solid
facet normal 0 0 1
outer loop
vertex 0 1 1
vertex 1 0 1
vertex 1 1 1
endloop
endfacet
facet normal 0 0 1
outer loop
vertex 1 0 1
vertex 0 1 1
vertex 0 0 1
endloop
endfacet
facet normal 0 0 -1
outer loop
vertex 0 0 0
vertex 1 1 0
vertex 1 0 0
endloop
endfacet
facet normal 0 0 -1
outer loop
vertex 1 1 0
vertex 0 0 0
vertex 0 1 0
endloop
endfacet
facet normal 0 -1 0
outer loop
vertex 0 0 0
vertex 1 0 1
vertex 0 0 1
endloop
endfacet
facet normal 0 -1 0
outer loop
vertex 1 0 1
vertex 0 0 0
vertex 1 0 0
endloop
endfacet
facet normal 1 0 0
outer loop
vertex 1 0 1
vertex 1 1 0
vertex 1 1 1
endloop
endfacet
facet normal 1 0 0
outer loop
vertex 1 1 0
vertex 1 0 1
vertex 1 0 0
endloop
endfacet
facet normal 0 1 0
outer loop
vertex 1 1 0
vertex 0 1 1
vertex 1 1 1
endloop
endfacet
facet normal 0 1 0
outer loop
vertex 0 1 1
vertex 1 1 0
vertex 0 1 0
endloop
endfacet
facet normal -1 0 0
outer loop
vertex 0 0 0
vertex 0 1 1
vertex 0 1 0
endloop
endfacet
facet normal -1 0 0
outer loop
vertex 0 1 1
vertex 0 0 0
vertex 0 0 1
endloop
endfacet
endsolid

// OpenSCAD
echo("WARNING: deterministic hard-warning fixture");
cube([1, 1, 1]);
